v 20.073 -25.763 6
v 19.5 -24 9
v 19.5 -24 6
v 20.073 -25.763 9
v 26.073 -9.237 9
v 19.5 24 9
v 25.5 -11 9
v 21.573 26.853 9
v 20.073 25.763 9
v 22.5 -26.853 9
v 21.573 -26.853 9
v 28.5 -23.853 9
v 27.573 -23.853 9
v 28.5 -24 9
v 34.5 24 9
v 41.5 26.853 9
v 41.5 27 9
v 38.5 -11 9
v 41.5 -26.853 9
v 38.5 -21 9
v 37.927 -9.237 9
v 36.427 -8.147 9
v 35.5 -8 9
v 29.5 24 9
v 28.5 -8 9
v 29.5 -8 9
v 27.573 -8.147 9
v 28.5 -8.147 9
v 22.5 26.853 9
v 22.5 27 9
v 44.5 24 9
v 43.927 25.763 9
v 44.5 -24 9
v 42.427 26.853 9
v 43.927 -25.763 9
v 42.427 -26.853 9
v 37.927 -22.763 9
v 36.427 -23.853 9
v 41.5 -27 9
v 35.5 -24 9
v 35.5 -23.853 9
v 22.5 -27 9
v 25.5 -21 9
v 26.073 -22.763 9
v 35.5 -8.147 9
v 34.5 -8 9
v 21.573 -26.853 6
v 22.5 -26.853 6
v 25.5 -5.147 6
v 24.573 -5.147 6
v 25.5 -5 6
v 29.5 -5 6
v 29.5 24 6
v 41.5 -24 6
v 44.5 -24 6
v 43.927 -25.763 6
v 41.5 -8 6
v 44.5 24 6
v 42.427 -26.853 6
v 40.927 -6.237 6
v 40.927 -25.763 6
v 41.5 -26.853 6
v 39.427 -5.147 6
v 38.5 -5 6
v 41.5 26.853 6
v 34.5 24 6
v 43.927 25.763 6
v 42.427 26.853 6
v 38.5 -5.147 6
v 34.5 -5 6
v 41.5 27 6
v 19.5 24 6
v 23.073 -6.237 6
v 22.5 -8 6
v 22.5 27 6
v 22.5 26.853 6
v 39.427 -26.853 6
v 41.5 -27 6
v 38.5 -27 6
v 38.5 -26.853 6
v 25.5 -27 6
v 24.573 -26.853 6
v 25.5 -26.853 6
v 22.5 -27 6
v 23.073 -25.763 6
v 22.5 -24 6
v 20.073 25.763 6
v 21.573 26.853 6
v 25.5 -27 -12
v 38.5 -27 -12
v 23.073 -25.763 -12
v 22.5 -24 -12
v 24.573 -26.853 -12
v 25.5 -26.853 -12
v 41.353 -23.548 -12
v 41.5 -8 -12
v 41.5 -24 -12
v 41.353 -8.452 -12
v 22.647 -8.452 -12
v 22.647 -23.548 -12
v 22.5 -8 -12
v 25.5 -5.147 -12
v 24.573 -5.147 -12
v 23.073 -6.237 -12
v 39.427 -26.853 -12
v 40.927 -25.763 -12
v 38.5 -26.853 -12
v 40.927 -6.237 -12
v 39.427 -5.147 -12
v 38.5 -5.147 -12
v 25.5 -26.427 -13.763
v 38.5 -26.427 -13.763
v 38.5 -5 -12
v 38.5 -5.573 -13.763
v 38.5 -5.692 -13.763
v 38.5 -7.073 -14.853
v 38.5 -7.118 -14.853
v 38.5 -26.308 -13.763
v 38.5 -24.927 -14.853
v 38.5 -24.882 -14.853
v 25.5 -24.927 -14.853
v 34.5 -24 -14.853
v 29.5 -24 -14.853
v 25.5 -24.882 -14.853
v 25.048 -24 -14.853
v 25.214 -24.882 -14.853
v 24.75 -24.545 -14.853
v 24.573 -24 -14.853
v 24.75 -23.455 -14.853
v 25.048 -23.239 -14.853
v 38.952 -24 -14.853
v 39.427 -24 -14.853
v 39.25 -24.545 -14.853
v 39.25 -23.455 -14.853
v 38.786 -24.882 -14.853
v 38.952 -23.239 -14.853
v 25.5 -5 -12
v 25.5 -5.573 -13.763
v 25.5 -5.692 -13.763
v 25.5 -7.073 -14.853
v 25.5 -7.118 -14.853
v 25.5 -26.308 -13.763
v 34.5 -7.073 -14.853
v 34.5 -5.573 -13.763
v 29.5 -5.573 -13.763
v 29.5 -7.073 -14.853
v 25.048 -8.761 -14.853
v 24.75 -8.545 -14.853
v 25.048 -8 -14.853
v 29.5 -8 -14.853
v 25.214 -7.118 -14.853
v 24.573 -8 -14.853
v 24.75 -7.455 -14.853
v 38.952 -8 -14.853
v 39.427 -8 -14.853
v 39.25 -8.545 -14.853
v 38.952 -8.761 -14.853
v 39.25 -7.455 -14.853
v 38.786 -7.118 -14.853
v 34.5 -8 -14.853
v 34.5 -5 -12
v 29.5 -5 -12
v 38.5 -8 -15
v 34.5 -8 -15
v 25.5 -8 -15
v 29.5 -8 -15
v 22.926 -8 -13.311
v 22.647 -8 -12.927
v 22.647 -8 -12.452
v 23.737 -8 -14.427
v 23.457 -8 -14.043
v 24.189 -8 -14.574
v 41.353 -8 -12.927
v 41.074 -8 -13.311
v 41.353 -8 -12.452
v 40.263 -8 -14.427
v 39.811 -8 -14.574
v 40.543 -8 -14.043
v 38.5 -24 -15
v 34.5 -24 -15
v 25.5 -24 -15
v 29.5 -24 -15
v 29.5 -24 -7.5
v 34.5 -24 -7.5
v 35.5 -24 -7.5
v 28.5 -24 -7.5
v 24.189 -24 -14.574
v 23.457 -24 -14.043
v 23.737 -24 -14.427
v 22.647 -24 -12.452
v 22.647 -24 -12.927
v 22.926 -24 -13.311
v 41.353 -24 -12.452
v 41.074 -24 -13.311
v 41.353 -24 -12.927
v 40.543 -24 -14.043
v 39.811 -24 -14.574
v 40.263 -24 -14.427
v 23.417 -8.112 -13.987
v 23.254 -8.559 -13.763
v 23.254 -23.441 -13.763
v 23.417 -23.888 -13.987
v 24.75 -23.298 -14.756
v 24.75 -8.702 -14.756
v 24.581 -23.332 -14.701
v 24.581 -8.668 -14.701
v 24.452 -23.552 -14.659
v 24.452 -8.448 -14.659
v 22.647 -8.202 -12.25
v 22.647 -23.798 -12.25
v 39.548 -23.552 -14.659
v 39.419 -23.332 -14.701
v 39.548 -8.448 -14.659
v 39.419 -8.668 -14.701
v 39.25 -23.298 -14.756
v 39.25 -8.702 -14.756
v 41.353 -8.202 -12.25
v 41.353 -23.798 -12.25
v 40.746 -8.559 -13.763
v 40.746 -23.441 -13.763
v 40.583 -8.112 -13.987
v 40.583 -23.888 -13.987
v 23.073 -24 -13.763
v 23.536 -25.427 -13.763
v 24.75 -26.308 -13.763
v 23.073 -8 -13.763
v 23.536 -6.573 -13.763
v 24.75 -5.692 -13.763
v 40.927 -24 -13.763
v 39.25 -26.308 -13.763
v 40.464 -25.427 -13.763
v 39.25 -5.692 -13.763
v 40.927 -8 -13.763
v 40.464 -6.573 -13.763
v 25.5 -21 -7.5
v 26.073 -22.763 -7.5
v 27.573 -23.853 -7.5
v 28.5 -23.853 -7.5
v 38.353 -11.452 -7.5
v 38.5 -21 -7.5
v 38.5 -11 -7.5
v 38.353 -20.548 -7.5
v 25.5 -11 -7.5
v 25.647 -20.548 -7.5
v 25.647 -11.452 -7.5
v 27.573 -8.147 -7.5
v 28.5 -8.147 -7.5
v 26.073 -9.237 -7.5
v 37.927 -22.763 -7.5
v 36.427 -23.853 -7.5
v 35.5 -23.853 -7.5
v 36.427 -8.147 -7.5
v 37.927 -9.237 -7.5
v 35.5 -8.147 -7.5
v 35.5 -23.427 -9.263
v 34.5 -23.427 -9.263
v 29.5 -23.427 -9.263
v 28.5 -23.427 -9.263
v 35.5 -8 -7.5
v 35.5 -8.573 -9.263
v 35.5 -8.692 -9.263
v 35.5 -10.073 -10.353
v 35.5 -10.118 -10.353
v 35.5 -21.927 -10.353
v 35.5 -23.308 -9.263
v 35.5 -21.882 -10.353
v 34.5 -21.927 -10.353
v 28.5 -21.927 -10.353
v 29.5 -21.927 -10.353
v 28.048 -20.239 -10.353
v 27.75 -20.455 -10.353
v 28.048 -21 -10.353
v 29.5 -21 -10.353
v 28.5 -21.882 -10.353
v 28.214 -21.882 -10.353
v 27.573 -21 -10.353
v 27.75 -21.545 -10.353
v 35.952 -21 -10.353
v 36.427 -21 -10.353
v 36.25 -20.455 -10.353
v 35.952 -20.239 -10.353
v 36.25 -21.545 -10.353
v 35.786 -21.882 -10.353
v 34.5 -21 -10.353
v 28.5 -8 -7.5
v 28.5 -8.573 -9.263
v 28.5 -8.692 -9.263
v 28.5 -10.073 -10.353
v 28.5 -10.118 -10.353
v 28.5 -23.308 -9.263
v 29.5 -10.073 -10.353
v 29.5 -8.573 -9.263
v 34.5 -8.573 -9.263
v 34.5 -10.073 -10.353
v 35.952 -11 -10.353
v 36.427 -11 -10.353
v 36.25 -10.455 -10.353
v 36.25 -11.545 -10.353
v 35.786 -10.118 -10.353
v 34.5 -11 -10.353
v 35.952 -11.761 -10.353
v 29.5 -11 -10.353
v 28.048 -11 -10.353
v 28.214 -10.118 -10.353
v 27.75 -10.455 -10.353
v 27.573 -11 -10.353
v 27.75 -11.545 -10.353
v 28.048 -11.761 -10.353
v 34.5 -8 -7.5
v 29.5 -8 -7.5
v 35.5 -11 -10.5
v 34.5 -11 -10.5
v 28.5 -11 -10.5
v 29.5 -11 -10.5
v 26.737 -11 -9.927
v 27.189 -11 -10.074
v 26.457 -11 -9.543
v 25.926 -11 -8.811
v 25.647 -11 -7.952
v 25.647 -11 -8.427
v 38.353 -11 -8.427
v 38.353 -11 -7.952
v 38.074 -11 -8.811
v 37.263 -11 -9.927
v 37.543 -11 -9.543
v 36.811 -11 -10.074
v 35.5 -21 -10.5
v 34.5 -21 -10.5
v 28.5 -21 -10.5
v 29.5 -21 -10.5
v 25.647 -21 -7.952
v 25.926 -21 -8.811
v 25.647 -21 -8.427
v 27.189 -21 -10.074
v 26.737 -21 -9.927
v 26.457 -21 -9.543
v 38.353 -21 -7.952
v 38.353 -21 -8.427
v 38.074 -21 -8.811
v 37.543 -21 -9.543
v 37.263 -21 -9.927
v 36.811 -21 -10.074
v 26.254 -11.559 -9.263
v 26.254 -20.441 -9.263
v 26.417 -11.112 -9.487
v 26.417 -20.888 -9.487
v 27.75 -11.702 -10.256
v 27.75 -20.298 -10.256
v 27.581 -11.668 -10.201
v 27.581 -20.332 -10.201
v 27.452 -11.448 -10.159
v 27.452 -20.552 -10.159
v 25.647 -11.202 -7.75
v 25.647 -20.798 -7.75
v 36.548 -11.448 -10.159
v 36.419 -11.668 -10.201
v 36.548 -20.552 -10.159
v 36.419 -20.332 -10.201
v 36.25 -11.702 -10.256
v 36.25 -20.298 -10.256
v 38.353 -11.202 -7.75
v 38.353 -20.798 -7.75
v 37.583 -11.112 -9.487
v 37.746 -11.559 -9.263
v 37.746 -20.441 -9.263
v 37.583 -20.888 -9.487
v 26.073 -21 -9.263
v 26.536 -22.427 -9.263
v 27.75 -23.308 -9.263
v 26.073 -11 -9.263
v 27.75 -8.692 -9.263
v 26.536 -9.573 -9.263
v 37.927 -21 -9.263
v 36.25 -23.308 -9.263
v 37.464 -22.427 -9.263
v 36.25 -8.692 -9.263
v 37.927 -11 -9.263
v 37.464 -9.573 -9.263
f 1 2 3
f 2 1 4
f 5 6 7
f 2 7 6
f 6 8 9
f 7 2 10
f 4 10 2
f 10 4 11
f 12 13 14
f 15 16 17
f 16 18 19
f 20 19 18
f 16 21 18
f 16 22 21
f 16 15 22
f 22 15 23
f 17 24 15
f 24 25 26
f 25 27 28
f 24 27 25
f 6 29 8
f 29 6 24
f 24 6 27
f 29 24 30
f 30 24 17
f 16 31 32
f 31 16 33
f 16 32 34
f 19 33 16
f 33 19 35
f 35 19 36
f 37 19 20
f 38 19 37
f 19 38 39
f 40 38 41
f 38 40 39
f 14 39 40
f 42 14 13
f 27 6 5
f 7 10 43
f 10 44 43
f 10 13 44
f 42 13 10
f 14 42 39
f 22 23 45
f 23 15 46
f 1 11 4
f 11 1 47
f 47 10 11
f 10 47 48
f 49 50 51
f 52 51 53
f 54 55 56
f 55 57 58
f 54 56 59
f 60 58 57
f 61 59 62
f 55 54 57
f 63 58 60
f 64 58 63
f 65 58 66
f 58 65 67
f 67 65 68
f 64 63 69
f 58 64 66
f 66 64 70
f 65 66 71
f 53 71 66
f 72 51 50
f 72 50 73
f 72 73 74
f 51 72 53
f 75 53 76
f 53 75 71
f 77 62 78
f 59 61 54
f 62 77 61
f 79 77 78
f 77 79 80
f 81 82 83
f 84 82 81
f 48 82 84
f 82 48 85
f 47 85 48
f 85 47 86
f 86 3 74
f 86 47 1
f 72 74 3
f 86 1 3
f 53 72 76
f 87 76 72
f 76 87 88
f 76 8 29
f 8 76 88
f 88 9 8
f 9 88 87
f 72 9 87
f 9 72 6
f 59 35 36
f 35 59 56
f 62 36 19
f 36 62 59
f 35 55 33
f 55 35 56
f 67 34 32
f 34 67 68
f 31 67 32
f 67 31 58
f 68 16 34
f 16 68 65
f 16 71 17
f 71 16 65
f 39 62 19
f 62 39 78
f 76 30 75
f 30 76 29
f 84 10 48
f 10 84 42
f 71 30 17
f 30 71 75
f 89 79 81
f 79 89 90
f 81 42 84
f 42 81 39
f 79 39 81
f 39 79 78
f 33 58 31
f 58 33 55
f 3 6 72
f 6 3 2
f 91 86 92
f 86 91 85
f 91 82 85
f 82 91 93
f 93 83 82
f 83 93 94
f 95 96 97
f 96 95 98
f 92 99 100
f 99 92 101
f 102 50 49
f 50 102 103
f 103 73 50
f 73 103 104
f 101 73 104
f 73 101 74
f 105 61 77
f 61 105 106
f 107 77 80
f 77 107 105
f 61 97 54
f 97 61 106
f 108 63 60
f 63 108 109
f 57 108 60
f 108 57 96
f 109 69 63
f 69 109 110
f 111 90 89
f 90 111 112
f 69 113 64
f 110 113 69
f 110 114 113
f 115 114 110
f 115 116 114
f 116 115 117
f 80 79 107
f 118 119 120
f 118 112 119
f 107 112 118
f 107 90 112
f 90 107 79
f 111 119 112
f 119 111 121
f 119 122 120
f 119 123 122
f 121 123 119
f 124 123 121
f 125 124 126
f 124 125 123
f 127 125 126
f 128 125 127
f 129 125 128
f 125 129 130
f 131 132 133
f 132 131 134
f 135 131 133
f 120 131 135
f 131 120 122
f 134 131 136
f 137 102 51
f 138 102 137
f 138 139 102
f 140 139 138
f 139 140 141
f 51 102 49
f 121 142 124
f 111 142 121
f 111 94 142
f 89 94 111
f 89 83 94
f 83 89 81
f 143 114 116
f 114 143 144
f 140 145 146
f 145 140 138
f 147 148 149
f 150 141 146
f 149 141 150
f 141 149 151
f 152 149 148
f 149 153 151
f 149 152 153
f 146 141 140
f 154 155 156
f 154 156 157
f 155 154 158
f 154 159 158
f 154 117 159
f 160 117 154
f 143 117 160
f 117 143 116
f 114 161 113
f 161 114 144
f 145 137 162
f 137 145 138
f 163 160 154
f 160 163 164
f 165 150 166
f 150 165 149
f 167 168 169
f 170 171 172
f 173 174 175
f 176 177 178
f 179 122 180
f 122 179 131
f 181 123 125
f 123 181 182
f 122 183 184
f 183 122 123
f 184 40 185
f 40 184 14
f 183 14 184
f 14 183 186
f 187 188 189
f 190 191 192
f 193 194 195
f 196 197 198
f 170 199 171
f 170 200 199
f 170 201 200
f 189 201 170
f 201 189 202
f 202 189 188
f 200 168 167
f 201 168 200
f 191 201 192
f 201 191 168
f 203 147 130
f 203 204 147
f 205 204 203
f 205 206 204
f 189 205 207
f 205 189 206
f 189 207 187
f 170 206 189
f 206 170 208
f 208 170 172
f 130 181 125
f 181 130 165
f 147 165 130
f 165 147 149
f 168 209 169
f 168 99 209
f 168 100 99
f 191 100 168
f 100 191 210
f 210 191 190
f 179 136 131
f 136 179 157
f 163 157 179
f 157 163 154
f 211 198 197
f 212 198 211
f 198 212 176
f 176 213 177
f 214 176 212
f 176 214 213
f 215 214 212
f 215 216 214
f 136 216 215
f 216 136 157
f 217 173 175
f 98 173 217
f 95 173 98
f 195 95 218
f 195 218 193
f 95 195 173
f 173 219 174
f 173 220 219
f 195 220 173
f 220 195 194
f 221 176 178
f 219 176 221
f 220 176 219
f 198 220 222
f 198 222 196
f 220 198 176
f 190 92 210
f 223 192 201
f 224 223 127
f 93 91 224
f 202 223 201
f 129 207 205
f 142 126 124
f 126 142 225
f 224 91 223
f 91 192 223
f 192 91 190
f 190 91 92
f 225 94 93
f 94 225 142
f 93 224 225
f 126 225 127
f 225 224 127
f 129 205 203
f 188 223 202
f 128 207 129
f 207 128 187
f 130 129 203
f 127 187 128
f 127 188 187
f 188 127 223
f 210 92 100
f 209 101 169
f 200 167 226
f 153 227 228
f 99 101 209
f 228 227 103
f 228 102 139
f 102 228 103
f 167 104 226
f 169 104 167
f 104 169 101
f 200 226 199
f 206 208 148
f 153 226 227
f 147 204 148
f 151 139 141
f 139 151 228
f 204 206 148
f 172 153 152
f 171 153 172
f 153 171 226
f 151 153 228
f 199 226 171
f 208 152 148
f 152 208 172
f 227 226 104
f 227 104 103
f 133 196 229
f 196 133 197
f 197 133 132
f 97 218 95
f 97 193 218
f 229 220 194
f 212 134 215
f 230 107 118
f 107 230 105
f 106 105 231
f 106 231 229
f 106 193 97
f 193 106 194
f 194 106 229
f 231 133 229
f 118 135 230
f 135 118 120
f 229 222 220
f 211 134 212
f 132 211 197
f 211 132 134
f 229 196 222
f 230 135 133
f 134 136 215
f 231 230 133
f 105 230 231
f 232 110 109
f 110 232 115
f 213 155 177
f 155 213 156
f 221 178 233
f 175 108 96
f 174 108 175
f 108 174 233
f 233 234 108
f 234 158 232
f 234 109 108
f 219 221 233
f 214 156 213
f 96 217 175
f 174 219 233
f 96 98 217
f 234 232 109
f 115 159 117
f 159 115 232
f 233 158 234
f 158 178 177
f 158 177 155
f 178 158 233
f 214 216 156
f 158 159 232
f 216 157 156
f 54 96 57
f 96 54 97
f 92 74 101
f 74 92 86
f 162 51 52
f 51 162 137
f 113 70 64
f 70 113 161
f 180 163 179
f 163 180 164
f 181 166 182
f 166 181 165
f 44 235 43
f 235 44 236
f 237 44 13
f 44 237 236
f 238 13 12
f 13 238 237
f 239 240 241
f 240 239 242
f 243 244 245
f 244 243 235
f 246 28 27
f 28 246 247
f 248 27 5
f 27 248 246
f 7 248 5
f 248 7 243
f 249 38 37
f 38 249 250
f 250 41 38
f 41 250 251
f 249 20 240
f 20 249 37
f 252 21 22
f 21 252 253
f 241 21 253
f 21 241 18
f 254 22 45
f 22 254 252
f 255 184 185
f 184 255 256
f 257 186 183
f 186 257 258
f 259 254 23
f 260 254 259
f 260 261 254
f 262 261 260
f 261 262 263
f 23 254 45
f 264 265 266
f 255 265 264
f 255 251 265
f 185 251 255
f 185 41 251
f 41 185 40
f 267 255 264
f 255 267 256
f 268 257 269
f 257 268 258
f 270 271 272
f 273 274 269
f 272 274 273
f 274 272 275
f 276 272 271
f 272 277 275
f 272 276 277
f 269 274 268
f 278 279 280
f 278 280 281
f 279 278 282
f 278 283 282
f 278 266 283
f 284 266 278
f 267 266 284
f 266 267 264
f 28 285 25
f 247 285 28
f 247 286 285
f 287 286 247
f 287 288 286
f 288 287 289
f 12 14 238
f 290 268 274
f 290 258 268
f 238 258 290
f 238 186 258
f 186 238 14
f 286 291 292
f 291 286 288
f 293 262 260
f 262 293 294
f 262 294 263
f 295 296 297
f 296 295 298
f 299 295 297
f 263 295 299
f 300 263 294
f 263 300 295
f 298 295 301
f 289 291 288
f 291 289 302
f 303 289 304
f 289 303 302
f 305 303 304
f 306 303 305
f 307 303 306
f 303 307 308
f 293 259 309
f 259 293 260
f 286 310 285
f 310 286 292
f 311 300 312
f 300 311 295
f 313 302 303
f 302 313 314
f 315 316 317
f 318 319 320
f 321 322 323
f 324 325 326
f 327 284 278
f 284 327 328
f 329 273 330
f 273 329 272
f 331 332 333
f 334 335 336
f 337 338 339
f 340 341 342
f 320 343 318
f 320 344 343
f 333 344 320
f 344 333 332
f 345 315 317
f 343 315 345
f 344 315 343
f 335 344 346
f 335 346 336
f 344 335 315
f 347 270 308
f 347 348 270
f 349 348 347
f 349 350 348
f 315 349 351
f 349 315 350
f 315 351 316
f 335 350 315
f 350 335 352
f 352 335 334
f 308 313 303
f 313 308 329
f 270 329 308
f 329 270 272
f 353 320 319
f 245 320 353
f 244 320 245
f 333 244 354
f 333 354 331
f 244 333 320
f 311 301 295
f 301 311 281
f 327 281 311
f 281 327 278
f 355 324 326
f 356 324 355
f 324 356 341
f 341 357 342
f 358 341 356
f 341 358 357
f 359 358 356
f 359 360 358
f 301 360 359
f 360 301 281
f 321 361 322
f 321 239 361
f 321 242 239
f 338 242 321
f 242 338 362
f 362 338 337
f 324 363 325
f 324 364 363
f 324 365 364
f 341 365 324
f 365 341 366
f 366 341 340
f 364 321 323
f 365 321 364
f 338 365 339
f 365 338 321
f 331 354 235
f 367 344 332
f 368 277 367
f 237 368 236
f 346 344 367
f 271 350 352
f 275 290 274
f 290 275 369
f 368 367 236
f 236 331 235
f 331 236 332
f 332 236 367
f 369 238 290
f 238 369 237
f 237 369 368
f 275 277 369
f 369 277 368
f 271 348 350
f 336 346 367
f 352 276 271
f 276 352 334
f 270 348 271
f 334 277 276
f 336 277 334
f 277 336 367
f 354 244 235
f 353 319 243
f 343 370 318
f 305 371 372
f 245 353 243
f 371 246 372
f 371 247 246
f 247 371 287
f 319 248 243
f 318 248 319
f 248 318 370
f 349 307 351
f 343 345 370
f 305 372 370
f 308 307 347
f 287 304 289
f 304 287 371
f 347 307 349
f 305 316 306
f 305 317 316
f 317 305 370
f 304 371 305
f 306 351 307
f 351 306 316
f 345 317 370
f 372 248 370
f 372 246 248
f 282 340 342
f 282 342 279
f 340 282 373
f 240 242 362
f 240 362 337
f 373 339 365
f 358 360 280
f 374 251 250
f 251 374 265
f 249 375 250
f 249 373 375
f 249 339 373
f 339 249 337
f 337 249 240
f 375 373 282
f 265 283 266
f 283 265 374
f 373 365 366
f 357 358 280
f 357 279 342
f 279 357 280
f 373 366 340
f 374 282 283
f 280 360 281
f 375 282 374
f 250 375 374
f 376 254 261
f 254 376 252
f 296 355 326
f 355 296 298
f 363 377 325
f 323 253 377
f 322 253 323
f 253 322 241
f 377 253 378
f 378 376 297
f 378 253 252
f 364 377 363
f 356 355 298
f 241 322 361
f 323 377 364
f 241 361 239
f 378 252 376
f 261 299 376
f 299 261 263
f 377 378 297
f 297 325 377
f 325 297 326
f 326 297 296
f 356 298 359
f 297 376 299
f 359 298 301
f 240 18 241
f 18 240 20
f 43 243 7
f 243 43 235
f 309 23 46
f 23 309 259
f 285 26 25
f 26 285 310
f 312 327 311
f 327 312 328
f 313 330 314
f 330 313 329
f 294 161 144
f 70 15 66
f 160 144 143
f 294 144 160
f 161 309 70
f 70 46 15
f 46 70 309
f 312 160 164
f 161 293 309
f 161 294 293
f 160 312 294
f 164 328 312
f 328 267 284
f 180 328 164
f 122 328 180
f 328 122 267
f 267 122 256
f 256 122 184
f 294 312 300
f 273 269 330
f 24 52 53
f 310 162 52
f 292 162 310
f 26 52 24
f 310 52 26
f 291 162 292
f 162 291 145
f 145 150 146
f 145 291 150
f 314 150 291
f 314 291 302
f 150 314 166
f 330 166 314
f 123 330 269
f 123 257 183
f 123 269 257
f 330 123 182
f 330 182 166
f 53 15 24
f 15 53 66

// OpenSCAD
// file: 칼.scad
use <MCAD/boxes.scad>
$fa=1;
$fs=0.4;
height = 24;

echo(version=version());


// 칼

// 거푸집	size[길이, 너비, 두께] base[평면, 높이, 두께]
function moldInner(hilt, margin) = [
	hilt[2] + margin * 2,
	hilt[1] + margin * 2,
	hilt[0] + margin * 2
];
module mold(hilt, radius, margin, base, color) {
	object = [hilt[2], hilt[1], hilt[0]];
	cut = radius > base[2] ? radius : base[2];
	outter = object + [(margin + base[2]) * 2, (margin + base[2]) * 2, -object[2] + (base[1] + margin + base[2]) * 2];
	inner = outter - [base[2] * 2, base[2] * 2, base[2] * 2];
	cutter = outter + [4, 4, 0];

	color(color) difference() {
				roundedBox(size=outter, radius=radius, sidesonly=false);
				roundedBox(size=inner, radius=radius, sidesonly=false);
				translate([0, 0, cutter[2] / 2]) cube(cutter, center = true);
	}
	
	//  상판
	color(color) difference() {
		translate([0, 0, -base[2]]) cube([outter[0] + margin * 2, outter[1] + margin * 2, base[2] * 2], center = true);
		roundedBox(size=inner, radius=radius, sidesonly=false);
	}
}

// 손잡이	[길이, 너비, 두께]
module hilt(size, radius, margin, color) {
	object = [size[2], size[1], size[0]];

	color(c=color) roundedBox(size=object,radius=margin,sidesonly=false);
}

// 칼날  [길이, 너비, 두께]
module blade(size, color) {
	object = [size[2], size[1], size[0]];

    color(c=color) cube(object, center = true);
}

// chefs knife, 손잡이[길이, 너비, 두께] 칼날[길이, 너비, 두께]
module chef(hilt, blade) {
    translate([0, 0 , hilt[0] / 2]) hilt(hilt, 2, 1, [0.5, 0.5, 0, 0.5]);
	translate([0, (blade[1] - hilt[1]) / 2 , -blade[0] / 2]) blade(blade, [0.8, 0.8, 0.9, 0.5]);
}

// 빵칼 bread knife 손잡이[길이, 너비, 두께] 칼날[길이, 너비, 두께]
module bread(hilt, blade) {
    translate([0, 0 , hilt[0] / 2]) hilt(hilt, 2, 2, [0.5, 0, 0, 0.5]);
	translate([0, 0, -blade[0] / 2]) blade(blade, [0.8, 0.9, 0.8, 0.5]);
}

module scissor(
    z1, y1, x1, //  길이, 너비, 두께
	y2, x2  //  중앙 튀어 나온곳 높이 너비
) {
	dz = -z1 / 3 + y2 / y1 * z1;
    color(c=[0.8, 0.8, 0.8, 0.5])   //검은색 계통
        translate([0, y1 / 2, dz])
            resize([x1, y1, z1])
				rotate([90, 90, 90])
					cylinder(1, 1, 1, $fn = 3);
    color(c=[0.5, 0.5, 0.1, 0.5])
        translate([(x1 - x2) / 2, y1 / 2, 0])
            rotate([90, 90, 90]) {
				cylinder(x2, 10, 10);
            }
}
module rsquare(x, y, m) {
	square([x - m * 2, y], center = true);
	square([x, y - m * 2], center = true);
	translate([x / 2 - m, y / 2 - m]) circle(m);
	translate([x / 2 - m, - y / 2 + m]) circle(m);
	translate([-x / 2 + m, y / 2 - m]) circle(m);
	translate([-x / 2 + m, -y / 2 + m]) circle(m);
}
module test(
   z1, y1, x1, //  길이, 너비, 너비 중앙, 두께
	y2, x2, z3  //  중앙 튀어 나온곳 높이 너비
) {
	linear_extrude(height = 50, center = true, convexity = 10) difference() {
		rsquare(x1, y1, 2);
		rsquare(x1 - 1, y1 - 1, 2);
	}
	difference() {
		square([x1 + 16, y1 + 16], center = true);
		rsquare(x1, y1, 2);
	}
}


module chefs(start, margin) {
    translate([start, 0, 0])   chef([140, 37, 20], [235, 46, 4]);
    translate([start + 20 + margin, 0, 0])   chef([140, 37, 20], [205, 52, 2]);
    translate([start + 20 + margin + (20 - 16) / 2, 52 + margin, 0])   chef([120, 30, 16], [162, 42, 2]);
	// 여유
    translate([start, 52 + margin, 0])   chef([140, 37, 20], [235, 46, 4]);
}
module breads(start, margin) {
    translate([start, 0, 0])   chef([112, 25, 20], [115, 27, 2]);
    translate([start + 20 + margin, 0, 0])   bread(112, 25, 15, 105, 20, 2);
	translate([start + 20 + 15 + margin * 2, 0, 0])   bread(106, 22, 13, 127, 17, 1);

    translate([start, 27 + margin, 0])   bread(112, 25, 20, 127, 20, 2);// 여유
    translate([start + 20 + margin, 27 + margin, 0])   bread(112, 25, 20, 127, 20, 2);// 여유
	translate([start + 20 + 20 + margin * 2, 27 + margin, 0])   bread(112, 25, 20, 127, 20, 2);// 여유

    translate([start, 50 + margin * 2, 0])   bread(112, 25, 15, 105, 20, 2);// 여유
    translate([start + 20 + margin, 50 + margin * 2, 0])   bread(112, 25, 15, 105, 20, 2);// 여유
	translate([start + 20 + 20 + margin * 2, 50 + margin * 2, 0])   bread(112, 25, 15, 105, 20, 2);// 여유

}
module scissors(start, margin) {
    translate([start, 0, 0])   scissor(220, 82, 12, 40, 14);
    translate([start, 40 + margin, 0])   scissor(220, 82, 12, 40, 14);
}
module knifes() {
    chefs(0, 10);
    breads(60, 10);
    scissors(150, 10);
}
opacity = 1;
colorScissor = [0.2, 0.3, 0.4, opacity];
// 가위 거푸집 body[길이, 너비, 두께] center[거리, 두께]
module moldScissor(body, center, margin, thick, color) {
	outter = [center[1] + (margin + thick) * 2, center[0] + (margin + thick) * 2, height];
	inner = outter - [margin * 2, margin * 2, -margin];
	color(color) {
		difference() {
			resize(outter) cylinder(h = outter[2], r1 = outter[1], r2 = outter[1], center = true);
			resize(inner) cylinder(h = inner[2], r1 = inner[1], r2 = inner[1], center = true);
		}
	}
}
module moldScissorInner(body, center, margin, thick, color) {
	outter = [center[1] + (margin + thick) * 2, center[0] + (margin + thick) * 2, height];
	inner = outter - [margin * 2, margin * 2, -margin];
	resize(inner) cylinder(h = inner[2], r1 = inner[1], r2 = inner[1], center = true);
}

chefs(0, 2);
// main file
use <MCAD/boxes.scad>
use <칼.scad>

// 상수
height = 24;
HEIGHT = height;
MARGIN = 1;
THICK = 3;
BIG = [1024, 1024, 1024];
opacity = 1;
colorScissor = [0.2, 0.3, 0.4, opacity];

// 측정

data = [
	[17, 20, 4, 46],	// 1번칼, 제일 긴거
	[25, 54, 3, 0],	// 상판
	[0, 0, 0, 0]	// 점, 호환성 예약
];
palette = [
	[0.3, 0.1, 0.0, 0.5],	//	갈색, 칼손잡이
	[0.5, 0.5, 0.5, 0.5],	//	회색, 칼날
	[0.9, 0.9, 0.9, 0.5],	//	흰색, 상판
	[0.0, 0.0, 0.0, 0.0]	//	검정 투명, 호환성 예약
];

echo(version=version());

module knifeNo1() {
	object = data[0];

	color(c=palette[0]) translate([0, object[1] / 2, HEIGHT / 2]) roundedBox(size=[object[0], object[1], HEIGHT], radius = 1, sidesonly = false);
	color(c=palette[1]) translate([0, object[3] / 2, -HEIGHT / 2]) roundedBox(size=[object[2], object[3], HEIGHT], radius = 1, sidesonly = false);
}

module moldKnifeNo1() {
	knife = data[0];
	object = data[1];

	// 상판
	difference() {
		color(c=palette[2]) roundedBox(size=object, radius = 3, sidesonly = true);

		hilt = [knife[0], knife[1], HEIGHT]; // 손잡이
		hiltMold = hilt + [MARGIN * 2, MARGIN * 2, 0];	// 손잡이 주형

		blade = [knife[2], knife[3], HEIGHT];
		bladeMold = blade + [MARGIN * 1, MARGIN * 2, 0];	// 칼날 주형

		translate([0, - bladeMold[1] / 2  + hiltMold[1] / 2])
			roundedBox(size=hiltMold, radius = 2, sidesonly = true);
		
		translate([0, 0, 0])
		cube(bladeMold, center = true);
	}
}

module prototype() {
	knife = data[0];
	outter = [knife[0], knife[1], HEIGHT] +  [MARGIN * 2, MARGIN * 2, 0];
	inner = outter - [THICK * 2, THICK * 2, THICK * 2];

	
	object = data[1];
	translate([32, 0,  (inner[2] - THICK) / 2]) {
		color(c=palette[1]) difference() {
			union() {
				roundedBox(size=object, radius = THICK, sidesonly = true);
				color(c=palette[0]) translate([0, -(knife[3] + MARGIN * 2 - inner[1]) / 2, -(outter[2] - THICK) / 2]) difference() {
					roundedBox(size=outter, radius = 3, sidesonly = false);
					translate([0, 0, THICK / 2]) roundedBox(size=inner, radius = 3, sidesonly = false);
					translate([0, 0, BIG[2] / 2 + inner[2] / 2]) roundedBox(size=BIG, radius = 0, sidesonly = false);	// z축 절단면 보기

			//		translate([BIG[0] / 2, 0, 0]) roundedBox(size=BIG, radius = 0, sidesonly = false);	// x축 절단면 보기
			//		translate([0, BIG[1] / 2, 0]) roundedBox(size=BIG, radius = 0, sidesonly = false);	// y축 절단면 보기
			//		translate([0, 0, BIG[2] / 2]) roundedBox(size=BIG, radius = 0, sidesonly = false);	// z축 절단면 보기
				}
			}
			translate([0, -(knife[3] + MARGIN * 2 - inner[1]) / 2, 0]) translate([0, 0, THICK / 2]) roundedBox(size=inner, radius = 3, sidesonly = false);	//	손잡이 주형
			translate([0, 0, 0])	roundedBox(size=[knife[2] + MARGIN, knife[3] + MARGIN * 2, HEIGHT * 2], radius = 0, sidesonly = true);	//		// 칼날 주형

	//		translate([BIG[0] / 2, 0, 0]) roundedBox(size=BIG, radius = 0, sidesonly = false);	// x축 절단면 보기
	//		translate([0, BIG[1] / 2, 0]) roundedBox(size=BIG, radius = 0, sidesonly = false);	// y축 절단면 보기
	//		translate([0, 0, BIG[2] / 2]) roundedBox(size=BIG, radius = 0, sidesonly = false);	// z축 절단면 보기
		}
	}

}

prototype();
